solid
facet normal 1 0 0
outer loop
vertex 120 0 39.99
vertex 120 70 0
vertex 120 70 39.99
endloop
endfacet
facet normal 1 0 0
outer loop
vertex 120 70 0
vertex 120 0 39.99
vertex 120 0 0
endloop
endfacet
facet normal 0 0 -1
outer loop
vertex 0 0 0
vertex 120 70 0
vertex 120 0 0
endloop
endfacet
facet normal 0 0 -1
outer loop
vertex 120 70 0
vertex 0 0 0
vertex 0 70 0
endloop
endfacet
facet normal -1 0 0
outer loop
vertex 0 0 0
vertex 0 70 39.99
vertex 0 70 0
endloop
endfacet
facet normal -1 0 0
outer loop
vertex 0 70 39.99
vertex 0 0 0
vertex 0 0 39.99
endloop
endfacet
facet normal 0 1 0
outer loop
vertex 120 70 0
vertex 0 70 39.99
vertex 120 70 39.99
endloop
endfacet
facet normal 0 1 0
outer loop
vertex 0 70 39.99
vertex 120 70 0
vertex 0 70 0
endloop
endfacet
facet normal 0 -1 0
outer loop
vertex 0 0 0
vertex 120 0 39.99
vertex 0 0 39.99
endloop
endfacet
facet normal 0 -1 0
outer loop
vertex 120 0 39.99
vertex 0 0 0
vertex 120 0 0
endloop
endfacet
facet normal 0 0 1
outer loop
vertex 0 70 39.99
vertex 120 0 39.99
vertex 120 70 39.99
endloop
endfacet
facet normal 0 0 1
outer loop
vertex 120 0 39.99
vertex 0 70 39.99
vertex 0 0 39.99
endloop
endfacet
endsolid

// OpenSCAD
// Buffer Tank for Mini Horizontal Gel Electrophoresis
// Units: millimetres

// Outer Dimensions
$w_outer = 120; // X width
$d_outer = 70;  // Y depth
$h_outer = 40;  // Z height

// Wall and Floor Thickness
$wall_thick = 3;
$floor_thick = 3;

// Platform Dimensions
$plat_len = 60;   // Length in X
$plat_width = $d_outer; // Spans full inner width
$plat_height = 10; // Height above inner floor

// Hole Dimensions
$hole_dia = 2;
$hole_y = 0;
$hole_z = 30;

// Configuration
$fn = 64;

// Derived Dimensions
$inner_w = $w_outer - 2*$wall_thick;
$inner_d = $d_outer - 2*$wall_thick;
$inner_h = $h_outer - $floor_thick;
$plat_z_top = $floor_thick + $plat_height;

// Main Tank Body
difference() {
    // 1. Create the outer box
    translate([0, 0, 0])
    cube([$w_outer, $d_outer, $h_outer], center=false);

    // 2. Cut the top opening (open-top tank)
    translate([0, 0, $h_outer - 0.01])
    cube([$w_outer, $d_outer, 1], center=false);

    // 3. Cut the inner cavity (floor + walls)
    // We subtract a block that represents the empty space inside the tank
    translate([0, 0, 0])
    difference() {
        // The block to subtract is the "void" inside the tank
        // It has the inner width, inner depth, and height up to the top of the walls
        // But we need to be careful with the platform cutout later.
        // Instead, let's build the solid tank and subtract the void.
        
        // Void block: Inner dimensions, height = outer height - floor thickness
        translate([$wall_thick, $wall_thick, $floor_thick])
        cube([$inner_w, $inner_d, $inner_h], center=false);
        
        // Add a tiny buffer to ensure clean cuts
        translate([$wall_thick, $wall_thick, $floor_thick])
        cube([$inner_w + 0.01, $inner_d + 0.01, $inner_h + 0.01], center=false);
    }
    
    // 4. Cut the Platform Void
    // The platform is solid, so we cut a hole in the tank where the platform is.
    // Platform position:
    // X: Centered, length $plat_len
    // Y: Spans full inner width ($inner_d)
    // Z: From floor ($floor_thick) to $plat_z_top
    
    translate([
        ($w_outer - $plat_len)/2, 
        $wall_thick, // Start at inner wall Y
        $floor_thick
    ])
    difference() {
        // Cut the volume of the platform
        cube([$plat_len, $inner_d, $plat_height], center=false);
        
        // Buffer for clean cut
        cube([$plat_len + 0.01, $inner_d + 0.01, $plat_height + 0.01], center=false);
    }
}

// Electrode Holes
// Drill 2mm diameter holes through the end walls at y=0, z=30 along X axis.
// Since the tank is open top, we just need to cut through the wall thickness.
// The wall is at X = +/- ($w_outer/2 - $wall_thick/2).
// Actually, the hole goes through the end wall.
// End wall X position: +/- ($w_outer/2 - $wall_thick/2)
// Wait, the hole is horizontal along X.
// So we drill a cylinder along the X axis.
// Center of hole: x = +/- ($w_outer/2 - $wall_thick/2), y = $hole_y, z = $hole_z.
// Radius = $hole_dia / 2.
// Length = $wall_thick (to go through the wall).

difference() {
    // We need to cut these holes from the existing tank.
    // Since we are inside a difference() block above, we can add another difference()
    // or simply use difference() again on the whole assembly.
    // Let's restart the main difference to include the holes cleanly.
}

// Re-structure to ensure holes are cut from the final solid
difference() {
    // 1. Base Tank (re-calculated for clarity in this block)
    translate([0, 0, 0])
    cube([$w_outer, $d_outer, $h_outer], center=false);
    
    // 2. Top Opening
    translate([0, 0, $h_outer - 0.01])
    cube([$w_outer, $d_outer, 1], center=false);
    
    // 3. Inner Cavity
    translate([$wall_thick, $wall_thick, $floor_thick])
    cube([$inner_w, $inner_d, $inner_h], center=false);
    
    // 4. Platform Void
    translate([
        ($w_outer - $plat_len)/2, 
        $wall_thick, 
        $floor_thick
    ])
    cube([$plat_len, $inner_d, $plat_height], center=false);
    
    // 5. Electrode Holes
    // Left Hole
    translate([
        -$w_outer/2 + $wall_thick/2, // Center of left wall
        $hole_y,
        $hole_z
    ])
    cylinder(h=$wall_thick, r=$hole_dia/2, $fn=$fn);
    
    // Right Hole
    translate([
        $w_outer/2 - $wall_thick/2, // Center of right wall
        $hole_y,
        $hole_z
    ])
    cylinder(h=$wall_thick, r=$hole_dia/2, $fn=$fn);
}
